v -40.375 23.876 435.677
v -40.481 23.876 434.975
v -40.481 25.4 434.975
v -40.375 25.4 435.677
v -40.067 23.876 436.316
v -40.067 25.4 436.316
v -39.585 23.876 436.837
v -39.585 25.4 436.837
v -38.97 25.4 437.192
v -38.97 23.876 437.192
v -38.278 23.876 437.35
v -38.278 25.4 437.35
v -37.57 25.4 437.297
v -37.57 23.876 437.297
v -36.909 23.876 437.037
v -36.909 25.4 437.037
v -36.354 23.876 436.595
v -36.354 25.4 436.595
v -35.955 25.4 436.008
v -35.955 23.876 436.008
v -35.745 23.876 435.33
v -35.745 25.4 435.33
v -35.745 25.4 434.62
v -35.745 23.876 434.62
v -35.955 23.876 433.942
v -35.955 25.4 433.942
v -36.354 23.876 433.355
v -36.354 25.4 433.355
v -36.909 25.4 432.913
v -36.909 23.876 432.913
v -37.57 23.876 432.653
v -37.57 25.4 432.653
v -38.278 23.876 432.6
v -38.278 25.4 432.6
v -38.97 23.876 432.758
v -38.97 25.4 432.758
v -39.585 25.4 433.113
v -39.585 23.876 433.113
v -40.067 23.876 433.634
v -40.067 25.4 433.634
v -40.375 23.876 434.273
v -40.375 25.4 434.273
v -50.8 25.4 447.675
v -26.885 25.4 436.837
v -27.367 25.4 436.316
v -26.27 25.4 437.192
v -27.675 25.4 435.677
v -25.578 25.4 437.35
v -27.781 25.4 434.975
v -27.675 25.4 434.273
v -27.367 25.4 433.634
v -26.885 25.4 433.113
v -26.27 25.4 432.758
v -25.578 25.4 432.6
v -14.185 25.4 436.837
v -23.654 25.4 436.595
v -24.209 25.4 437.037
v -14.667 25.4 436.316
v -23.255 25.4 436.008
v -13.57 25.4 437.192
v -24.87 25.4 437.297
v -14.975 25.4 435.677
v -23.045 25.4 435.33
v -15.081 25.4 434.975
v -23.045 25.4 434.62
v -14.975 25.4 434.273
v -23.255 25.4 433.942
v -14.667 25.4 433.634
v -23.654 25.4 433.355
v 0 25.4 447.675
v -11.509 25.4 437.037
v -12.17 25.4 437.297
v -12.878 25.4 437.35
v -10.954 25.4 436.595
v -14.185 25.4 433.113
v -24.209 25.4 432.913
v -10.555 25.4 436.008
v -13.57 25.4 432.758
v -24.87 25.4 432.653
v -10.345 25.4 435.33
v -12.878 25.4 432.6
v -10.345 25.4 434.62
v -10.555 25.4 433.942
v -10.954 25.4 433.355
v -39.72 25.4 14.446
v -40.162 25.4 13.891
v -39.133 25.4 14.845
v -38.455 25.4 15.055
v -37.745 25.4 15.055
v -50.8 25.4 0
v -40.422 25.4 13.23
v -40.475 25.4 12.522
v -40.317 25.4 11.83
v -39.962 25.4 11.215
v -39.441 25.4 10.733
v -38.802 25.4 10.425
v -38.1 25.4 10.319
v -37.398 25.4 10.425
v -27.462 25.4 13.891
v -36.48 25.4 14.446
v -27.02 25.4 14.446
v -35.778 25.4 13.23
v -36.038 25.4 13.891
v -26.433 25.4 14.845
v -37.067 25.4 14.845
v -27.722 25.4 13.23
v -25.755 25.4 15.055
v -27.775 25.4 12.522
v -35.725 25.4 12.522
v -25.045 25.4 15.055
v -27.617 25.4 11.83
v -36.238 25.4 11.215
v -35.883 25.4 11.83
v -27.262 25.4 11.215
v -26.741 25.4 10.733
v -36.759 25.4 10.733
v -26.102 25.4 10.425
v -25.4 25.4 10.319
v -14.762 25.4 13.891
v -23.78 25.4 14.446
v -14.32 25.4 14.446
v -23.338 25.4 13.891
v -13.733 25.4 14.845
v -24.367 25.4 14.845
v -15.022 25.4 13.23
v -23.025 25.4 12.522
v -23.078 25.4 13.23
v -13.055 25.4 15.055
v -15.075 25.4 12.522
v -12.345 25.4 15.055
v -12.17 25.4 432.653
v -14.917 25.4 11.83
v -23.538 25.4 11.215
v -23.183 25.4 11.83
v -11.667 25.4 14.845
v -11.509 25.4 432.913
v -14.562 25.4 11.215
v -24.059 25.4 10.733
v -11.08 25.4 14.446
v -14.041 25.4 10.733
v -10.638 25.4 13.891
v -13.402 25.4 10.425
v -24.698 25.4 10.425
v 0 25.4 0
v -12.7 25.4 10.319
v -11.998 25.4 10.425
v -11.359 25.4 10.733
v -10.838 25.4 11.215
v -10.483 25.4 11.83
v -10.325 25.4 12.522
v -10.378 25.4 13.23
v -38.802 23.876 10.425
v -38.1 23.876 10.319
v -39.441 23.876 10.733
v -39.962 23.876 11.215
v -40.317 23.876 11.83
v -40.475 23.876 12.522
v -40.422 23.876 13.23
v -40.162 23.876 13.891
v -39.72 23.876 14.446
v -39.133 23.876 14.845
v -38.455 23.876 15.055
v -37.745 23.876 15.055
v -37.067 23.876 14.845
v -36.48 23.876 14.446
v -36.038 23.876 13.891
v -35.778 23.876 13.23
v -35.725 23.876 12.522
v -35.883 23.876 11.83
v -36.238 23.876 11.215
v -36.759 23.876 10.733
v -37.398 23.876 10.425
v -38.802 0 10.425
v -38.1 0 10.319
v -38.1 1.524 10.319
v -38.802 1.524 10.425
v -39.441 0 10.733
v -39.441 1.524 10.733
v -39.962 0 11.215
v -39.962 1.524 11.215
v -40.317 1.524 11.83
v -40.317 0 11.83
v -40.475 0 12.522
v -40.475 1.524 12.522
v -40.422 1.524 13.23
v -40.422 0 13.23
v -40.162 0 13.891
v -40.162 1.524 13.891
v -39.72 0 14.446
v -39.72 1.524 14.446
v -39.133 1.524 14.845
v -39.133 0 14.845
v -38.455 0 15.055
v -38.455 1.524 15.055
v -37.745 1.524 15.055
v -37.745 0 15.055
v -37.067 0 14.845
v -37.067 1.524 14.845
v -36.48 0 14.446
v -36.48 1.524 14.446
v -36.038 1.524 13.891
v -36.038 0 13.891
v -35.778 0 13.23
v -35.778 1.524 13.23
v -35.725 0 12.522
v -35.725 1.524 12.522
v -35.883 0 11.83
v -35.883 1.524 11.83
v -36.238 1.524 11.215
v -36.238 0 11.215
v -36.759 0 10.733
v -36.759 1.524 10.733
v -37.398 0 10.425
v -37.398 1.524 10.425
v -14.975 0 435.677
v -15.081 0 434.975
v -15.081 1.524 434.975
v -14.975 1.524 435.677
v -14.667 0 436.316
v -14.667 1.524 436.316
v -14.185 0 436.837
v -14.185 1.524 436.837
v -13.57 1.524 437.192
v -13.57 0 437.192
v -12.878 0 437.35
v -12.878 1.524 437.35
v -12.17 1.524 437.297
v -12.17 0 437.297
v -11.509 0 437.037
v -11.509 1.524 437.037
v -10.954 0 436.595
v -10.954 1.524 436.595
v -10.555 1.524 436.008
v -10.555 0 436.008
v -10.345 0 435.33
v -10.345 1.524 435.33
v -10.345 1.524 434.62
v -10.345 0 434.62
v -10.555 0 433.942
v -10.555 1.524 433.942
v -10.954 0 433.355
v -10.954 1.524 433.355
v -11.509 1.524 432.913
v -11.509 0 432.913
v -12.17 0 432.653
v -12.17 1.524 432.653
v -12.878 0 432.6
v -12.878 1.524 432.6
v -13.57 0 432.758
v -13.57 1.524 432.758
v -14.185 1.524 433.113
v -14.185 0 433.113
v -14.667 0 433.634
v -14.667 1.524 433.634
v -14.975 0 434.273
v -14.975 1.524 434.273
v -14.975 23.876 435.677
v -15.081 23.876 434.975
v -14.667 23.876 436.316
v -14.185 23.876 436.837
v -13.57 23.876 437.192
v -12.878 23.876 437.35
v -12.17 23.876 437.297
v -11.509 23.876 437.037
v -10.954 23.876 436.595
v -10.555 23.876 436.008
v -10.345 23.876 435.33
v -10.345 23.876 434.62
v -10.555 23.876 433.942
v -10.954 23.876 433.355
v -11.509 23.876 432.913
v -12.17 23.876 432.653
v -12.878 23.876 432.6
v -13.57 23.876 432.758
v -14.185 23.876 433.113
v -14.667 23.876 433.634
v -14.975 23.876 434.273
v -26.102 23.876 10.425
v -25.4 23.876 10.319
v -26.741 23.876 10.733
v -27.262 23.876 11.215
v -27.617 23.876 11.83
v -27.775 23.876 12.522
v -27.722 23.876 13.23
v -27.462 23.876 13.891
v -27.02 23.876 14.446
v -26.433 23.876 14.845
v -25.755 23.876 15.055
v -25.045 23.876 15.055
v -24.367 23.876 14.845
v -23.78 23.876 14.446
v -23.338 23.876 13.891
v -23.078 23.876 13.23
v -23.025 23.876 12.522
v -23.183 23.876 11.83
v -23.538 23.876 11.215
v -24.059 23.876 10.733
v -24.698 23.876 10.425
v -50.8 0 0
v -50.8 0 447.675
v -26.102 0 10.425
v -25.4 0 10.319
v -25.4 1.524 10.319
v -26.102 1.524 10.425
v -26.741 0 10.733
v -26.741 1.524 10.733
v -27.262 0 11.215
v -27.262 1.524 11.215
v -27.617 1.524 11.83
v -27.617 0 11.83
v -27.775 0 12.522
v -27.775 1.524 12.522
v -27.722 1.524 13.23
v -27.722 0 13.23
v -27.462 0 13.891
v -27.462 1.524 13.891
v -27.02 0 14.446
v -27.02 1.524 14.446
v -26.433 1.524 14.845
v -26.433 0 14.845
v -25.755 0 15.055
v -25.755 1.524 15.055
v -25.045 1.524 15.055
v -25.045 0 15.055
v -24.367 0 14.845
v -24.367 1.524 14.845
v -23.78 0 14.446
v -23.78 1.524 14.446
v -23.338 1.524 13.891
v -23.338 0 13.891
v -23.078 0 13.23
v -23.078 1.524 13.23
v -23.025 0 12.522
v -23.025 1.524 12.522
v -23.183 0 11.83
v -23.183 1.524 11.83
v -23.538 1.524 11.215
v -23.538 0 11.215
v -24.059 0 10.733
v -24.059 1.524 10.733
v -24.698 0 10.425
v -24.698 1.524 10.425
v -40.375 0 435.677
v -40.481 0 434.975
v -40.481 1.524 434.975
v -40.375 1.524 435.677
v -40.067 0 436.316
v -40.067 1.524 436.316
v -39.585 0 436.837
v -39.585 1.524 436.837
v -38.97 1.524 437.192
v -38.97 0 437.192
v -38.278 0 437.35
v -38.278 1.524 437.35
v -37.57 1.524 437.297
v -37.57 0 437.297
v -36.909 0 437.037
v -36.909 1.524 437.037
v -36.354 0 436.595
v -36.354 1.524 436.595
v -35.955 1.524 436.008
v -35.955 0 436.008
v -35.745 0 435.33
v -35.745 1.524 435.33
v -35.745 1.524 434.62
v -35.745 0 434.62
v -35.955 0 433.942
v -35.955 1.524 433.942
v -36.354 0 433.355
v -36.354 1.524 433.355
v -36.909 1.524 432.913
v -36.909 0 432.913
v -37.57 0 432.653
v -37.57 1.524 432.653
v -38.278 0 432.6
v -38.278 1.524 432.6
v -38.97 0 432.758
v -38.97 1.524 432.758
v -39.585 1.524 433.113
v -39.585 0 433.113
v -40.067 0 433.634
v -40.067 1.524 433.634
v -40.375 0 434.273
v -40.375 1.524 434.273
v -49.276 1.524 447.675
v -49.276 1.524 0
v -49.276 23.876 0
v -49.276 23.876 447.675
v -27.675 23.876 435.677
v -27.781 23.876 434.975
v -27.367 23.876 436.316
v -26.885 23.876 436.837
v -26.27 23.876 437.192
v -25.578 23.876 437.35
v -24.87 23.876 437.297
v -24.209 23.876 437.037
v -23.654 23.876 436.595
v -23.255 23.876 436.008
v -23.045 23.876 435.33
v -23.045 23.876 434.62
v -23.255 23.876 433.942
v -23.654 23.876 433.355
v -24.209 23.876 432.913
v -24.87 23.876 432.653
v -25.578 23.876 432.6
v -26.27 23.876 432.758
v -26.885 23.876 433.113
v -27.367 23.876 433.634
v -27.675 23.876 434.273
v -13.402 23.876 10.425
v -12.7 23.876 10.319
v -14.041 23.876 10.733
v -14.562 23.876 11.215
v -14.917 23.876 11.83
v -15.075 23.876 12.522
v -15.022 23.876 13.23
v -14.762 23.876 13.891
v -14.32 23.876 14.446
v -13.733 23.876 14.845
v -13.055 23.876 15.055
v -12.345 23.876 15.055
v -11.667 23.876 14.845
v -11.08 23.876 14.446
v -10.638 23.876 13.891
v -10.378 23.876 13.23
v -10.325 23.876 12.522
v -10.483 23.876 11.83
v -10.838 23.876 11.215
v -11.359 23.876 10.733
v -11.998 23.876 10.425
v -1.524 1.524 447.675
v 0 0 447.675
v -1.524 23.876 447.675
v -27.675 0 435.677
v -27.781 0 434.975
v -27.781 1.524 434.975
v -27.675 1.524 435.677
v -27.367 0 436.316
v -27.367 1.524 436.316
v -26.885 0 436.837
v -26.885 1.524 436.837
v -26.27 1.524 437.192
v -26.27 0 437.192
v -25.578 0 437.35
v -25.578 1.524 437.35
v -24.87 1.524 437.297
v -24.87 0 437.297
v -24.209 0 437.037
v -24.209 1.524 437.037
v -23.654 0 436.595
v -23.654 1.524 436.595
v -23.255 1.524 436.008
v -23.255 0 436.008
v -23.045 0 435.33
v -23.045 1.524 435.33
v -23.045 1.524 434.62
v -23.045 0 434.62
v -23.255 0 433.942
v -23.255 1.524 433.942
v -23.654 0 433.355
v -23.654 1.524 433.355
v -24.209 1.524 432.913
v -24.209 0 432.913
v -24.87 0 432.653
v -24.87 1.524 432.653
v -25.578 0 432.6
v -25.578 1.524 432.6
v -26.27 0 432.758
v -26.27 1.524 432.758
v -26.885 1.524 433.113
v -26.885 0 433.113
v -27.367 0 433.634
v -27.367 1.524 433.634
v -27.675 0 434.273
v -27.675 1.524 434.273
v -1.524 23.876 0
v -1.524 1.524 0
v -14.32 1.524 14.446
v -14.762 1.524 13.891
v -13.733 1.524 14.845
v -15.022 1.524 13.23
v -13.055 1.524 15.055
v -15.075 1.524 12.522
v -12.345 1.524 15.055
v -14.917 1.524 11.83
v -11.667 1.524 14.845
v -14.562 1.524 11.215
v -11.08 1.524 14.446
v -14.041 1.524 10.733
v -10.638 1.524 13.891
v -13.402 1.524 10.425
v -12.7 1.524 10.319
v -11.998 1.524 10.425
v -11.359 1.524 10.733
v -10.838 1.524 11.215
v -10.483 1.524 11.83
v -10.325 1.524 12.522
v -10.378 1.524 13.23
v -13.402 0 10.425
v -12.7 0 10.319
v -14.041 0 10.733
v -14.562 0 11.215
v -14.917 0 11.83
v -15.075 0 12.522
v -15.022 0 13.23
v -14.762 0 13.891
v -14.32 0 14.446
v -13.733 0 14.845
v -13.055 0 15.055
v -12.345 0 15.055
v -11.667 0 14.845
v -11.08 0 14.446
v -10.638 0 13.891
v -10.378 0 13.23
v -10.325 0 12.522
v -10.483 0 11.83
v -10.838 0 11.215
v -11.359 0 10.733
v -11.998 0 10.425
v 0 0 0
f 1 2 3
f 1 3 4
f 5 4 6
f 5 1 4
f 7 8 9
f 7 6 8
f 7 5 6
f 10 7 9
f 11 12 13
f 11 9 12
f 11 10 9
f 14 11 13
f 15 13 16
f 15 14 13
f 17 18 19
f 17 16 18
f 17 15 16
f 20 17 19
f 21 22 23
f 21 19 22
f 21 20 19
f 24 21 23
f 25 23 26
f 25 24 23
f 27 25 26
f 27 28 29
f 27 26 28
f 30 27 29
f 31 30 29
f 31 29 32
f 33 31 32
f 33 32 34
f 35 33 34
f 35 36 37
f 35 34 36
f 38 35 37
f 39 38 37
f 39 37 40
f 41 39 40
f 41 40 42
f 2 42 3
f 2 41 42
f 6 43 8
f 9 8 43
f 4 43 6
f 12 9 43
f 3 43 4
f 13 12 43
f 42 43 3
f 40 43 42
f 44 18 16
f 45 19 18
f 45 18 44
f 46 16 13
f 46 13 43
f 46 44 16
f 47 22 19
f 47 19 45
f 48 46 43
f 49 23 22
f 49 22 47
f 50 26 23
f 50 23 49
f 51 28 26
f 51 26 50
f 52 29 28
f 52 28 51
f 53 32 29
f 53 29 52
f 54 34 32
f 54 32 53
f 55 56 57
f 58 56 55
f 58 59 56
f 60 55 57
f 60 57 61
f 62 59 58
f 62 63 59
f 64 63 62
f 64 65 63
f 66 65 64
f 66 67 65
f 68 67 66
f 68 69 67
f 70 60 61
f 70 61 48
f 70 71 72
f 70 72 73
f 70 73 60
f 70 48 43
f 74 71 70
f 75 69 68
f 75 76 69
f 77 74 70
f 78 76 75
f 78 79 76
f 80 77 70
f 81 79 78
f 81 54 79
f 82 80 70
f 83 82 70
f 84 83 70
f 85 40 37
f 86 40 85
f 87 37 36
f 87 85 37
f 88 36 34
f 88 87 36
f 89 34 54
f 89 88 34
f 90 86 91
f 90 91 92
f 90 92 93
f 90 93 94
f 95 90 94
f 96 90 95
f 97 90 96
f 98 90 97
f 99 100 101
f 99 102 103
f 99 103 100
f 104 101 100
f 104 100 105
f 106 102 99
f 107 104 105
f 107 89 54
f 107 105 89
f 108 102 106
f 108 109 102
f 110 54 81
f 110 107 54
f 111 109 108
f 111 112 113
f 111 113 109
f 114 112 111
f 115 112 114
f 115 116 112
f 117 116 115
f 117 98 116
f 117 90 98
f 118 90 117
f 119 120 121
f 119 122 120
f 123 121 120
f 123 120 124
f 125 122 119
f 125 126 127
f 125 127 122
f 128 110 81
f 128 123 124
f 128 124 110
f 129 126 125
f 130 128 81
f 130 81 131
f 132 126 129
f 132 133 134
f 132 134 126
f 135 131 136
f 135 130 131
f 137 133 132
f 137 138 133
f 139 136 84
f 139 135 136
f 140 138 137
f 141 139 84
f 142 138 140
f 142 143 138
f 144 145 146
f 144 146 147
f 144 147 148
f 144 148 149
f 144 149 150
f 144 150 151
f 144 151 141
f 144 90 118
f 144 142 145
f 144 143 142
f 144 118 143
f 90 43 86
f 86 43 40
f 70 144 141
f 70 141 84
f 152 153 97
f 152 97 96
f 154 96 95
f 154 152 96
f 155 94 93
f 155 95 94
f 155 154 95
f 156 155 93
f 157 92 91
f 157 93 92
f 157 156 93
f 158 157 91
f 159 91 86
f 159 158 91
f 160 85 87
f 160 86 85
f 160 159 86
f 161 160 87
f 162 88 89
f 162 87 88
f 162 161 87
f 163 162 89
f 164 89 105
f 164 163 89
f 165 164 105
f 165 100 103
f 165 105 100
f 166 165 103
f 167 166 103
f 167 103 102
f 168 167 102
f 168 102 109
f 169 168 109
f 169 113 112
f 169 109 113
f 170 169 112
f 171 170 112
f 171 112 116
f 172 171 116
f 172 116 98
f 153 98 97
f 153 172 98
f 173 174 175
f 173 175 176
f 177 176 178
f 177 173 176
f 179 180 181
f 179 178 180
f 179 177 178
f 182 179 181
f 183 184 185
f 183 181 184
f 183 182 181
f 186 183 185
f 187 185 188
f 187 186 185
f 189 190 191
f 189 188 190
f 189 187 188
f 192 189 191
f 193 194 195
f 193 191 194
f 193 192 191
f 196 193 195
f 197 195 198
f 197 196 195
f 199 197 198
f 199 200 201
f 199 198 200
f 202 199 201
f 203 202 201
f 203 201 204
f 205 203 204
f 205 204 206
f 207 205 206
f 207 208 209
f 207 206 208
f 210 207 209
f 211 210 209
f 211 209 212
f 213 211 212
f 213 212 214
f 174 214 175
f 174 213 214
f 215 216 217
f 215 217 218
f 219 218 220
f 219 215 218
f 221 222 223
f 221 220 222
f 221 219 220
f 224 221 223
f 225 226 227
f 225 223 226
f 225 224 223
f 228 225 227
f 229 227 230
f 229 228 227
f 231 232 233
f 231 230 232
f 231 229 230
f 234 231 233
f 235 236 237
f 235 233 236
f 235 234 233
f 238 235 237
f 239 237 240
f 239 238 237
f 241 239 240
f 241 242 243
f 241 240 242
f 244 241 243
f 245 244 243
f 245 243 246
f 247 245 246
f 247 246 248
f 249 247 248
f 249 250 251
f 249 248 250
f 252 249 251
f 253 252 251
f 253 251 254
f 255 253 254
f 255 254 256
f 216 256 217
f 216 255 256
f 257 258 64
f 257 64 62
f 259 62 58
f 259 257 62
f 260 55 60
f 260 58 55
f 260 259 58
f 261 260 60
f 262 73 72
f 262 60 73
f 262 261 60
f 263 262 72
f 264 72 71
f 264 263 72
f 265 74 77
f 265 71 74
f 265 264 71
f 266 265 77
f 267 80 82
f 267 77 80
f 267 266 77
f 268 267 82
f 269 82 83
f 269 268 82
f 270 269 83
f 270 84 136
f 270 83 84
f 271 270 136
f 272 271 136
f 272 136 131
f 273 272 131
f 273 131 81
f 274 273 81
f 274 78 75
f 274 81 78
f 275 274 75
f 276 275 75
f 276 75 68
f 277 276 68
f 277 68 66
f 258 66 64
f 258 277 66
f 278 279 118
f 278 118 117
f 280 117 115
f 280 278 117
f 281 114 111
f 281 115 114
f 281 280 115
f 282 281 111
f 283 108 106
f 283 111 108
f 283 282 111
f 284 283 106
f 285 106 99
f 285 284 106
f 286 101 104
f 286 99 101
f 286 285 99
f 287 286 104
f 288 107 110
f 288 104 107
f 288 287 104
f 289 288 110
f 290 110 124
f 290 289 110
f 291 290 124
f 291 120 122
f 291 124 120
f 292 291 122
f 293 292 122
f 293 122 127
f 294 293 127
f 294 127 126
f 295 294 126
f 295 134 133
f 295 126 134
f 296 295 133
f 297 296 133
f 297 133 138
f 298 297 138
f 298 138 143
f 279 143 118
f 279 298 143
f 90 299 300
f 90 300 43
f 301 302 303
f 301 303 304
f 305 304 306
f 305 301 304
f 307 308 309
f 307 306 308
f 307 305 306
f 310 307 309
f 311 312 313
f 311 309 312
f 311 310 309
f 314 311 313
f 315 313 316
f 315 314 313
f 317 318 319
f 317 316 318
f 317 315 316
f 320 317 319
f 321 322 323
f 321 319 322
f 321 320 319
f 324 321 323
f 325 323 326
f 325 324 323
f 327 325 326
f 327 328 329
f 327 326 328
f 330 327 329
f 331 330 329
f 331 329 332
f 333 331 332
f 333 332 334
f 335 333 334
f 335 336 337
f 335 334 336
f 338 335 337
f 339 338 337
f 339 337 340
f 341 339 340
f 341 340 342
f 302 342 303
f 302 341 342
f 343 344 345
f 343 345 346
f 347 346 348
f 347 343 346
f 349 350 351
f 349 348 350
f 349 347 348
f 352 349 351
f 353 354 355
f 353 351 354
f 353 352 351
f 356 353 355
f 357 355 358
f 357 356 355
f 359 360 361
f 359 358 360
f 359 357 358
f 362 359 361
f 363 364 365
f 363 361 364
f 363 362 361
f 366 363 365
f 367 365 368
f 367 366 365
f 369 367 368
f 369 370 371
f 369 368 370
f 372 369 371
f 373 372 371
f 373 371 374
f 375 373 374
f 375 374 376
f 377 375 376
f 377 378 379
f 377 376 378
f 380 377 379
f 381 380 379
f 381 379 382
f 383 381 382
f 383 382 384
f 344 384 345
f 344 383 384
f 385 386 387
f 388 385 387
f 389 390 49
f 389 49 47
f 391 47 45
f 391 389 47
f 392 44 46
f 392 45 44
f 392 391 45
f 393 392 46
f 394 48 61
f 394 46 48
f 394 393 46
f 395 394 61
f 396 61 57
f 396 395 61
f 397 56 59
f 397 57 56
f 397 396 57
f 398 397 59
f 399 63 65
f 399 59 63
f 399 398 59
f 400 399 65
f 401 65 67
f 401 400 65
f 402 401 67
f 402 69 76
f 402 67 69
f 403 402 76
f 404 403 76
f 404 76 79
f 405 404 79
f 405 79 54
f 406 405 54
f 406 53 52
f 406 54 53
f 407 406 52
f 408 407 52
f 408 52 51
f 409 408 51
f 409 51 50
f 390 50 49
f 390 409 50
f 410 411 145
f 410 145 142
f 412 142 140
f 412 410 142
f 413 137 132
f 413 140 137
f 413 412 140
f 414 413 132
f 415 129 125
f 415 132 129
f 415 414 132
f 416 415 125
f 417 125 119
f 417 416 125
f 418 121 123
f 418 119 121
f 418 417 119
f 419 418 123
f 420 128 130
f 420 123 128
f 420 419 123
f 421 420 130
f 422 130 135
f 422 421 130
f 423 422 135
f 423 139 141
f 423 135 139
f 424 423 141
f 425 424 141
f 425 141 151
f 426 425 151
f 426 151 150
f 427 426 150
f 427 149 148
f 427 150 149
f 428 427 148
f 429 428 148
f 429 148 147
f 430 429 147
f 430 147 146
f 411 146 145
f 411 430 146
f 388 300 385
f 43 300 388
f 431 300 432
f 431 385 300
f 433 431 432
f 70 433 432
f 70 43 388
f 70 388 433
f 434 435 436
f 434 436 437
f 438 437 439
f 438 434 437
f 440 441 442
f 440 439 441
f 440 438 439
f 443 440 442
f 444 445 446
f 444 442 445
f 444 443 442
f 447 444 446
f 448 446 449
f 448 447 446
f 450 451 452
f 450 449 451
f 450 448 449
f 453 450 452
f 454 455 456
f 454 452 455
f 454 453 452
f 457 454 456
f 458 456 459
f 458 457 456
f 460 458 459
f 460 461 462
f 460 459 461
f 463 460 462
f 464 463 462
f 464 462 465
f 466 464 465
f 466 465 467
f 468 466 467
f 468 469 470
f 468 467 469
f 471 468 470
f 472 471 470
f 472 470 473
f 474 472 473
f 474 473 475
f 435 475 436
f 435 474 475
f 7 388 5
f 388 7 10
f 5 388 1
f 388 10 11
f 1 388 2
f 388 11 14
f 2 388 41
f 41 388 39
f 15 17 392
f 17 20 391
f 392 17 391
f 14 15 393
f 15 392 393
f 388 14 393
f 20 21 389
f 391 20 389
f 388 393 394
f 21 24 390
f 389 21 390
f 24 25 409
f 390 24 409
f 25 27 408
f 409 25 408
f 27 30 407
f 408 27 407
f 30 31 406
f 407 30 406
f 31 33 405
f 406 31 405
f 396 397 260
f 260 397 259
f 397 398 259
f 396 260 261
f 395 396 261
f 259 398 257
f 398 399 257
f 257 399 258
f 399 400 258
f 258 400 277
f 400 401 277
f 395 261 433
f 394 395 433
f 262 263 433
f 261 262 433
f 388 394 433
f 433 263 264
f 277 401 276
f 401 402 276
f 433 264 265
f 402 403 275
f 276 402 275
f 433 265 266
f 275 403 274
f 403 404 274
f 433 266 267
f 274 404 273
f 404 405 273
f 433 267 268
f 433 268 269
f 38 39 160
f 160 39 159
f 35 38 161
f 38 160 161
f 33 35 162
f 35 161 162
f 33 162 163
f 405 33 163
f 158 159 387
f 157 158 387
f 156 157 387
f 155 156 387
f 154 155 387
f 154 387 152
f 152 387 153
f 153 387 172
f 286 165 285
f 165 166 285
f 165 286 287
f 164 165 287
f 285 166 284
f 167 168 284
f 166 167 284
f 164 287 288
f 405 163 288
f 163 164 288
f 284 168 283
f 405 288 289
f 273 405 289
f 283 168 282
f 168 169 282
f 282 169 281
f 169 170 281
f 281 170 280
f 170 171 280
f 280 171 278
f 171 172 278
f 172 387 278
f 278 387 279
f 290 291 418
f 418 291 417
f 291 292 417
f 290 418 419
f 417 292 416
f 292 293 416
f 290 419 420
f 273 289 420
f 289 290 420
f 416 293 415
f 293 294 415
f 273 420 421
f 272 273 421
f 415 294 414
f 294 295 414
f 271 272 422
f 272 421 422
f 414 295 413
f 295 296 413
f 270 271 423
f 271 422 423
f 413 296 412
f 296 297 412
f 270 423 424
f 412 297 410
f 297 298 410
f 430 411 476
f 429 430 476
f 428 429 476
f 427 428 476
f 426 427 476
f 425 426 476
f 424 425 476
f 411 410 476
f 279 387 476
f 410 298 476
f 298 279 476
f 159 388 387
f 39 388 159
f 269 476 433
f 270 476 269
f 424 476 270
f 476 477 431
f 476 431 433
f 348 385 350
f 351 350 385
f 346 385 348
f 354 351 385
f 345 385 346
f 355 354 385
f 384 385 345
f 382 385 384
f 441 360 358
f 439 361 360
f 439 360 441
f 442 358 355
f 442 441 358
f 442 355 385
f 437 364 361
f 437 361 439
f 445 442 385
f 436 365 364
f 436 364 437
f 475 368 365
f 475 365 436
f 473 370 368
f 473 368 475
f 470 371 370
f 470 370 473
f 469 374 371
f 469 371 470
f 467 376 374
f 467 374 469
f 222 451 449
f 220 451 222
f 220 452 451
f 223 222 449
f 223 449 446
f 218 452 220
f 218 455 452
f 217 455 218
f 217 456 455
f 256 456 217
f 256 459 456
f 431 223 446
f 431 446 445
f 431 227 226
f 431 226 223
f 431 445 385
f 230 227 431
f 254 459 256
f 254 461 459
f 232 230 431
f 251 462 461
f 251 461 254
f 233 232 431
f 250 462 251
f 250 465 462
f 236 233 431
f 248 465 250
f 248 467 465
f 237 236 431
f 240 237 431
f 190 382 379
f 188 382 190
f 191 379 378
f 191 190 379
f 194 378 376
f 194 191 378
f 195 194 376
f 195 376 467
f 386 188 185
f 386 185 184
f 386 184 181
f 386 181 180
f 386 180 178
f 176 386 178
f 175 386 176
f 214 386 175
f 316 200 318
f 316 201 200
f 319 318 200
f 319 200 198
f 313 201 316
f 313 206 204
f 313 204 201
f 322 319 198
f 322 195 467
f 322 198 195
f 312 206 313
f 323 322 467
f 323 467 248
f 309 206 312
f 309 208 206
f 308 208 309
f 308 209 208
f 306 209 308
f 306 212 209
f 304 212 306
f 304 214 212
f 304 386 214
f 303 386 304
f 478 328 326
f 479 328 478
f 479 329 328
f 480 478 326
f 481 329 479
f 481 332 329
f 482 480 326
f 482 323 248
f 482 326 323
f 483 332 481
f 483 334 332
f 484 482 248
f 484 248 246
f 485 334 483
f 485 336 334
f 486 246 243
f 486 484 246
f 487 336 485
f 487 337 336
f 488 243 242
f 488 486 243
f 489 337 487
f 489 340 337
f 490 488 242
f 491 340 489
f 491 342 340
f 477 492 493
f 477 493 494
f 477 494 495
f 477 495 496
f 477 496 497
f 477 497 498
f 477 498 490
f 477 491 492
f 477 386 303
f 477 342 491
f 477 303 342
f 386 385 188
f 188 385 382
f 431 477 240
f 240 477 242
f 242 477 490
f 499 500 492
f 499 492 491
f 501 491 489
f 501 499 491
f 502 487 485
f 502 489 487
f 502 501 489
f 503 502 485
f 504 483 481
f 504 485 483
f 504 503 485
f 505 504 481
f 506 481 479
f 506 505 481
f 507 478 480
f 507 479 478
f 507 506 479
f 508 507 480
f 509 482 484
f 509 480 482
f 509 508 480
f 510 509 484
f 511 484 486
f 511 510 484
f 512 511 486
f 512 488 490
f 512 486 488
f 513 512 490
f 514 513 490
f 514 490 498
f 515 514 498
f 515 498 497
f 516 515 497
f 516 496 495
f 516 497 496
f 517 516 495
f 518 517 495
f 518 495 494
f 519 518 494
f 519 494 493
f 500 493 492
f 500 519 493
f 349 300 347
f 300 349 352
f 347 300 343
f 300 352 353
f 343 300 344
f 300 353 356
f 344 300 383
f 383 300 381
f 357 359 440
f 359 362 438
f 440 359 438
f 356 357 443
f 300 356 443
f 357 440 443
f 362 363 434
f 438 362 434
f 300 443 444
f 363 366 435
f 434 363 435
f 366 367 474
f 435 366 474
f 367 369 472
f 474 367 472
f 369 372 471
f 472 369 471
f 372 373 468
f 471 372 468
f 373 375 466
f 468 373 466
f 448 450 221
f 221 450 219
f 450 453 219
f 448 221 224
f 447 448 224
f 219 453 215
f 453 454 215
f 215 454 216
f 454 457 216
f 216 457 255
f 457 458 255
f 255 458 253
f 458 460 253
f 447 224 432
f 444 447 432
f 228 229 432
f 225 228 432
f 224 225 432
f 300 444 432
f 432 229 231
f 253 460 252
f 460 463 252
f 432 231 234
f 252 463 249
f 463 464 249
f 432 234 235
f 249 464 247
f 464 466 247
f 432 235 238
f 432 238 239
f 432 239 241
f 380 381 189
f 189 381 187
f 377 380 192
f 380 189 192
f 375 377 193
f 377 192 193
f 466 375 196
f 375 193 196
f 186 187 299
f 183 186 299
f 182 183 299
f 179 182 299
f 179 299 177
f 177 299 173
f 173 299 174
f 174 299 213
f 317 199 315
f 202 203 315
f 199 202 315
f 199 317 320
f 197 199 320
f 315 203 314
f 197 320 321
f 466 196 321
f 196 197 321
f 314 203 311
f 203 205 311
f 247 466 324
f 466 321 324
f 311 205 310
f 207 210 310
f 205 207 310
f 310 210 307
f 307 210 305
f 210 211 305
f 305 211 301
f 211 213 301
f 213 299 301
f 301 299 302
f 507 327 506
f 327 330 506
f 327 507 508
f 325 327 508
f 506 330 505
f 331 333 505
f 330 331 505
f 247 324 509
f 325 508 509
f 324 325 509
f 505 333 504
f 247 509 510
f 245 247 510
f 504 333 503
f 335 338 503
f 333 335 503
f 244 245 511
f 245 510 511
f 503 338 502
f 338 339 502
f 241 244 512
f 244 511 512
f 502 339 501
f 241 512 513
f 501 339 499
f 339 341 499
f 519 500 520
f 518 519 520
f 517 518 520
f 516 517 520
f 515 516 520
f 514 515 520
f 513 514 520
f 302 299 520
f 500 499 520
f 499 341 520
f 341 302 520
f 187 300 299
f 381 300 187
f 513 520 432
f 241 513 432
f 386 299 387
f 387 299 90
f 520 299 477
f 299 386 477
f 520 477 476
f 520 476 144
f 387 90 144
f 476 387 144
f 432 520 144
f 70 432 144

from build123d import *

# Parameters (mm, degrees)
SKETCH1_W               = 50.8
SKETCH1_H               = 25.4
SKETCH1_W_2             = 47.752
SKETCH1_H_2             = 22.352
EXTRUDE_THIN1_DEPTH     = 447.675
CUT_EXTRUDE1_DEPTH      = 452.263454786
CUT_EXTRUDE1_DEPTH_BACK = 452.263454786
SKETCH2_R               = 2.38125


with BuildPart() as part:
    # Sketch1 → Extrude-Thin1 (new body)
    with BuildSketch(Plane.XY):
        with Locations((-25.4, 12.7)):
            Rectangle(SKETCH1_W, SKETCH1_H)
        with Locations((-25.4, 12.7)):
            Rectangle(SKETCH1_W_2, SKETCH1_H_2, mode=Mode.SUBTRACT)
    extrude(amount=EXTRUDE_THIN1_DEPTH)

    # Sketch2 → Cut-Extrude1 (cut, two sides: drawn at the far end of the back side and taken through both)
    with BuildSketch(Plane(origin=(0, 25.4, 0), x_dir=(1, 0, 0), z_dir=(0, 1, 0)).offset(-CUT_EXTRUDE1_DEPTH_BACK)):
        with Locations(Location((-38.1, -434.975, 0), (0, 0, 180))):
            Circle(SKETCH2_R)
        with Locations(Location((-25.4, -434.975, 0), (0, 0, 180))):
            Circle(SKETCH2_R)
        with Locations(Location((-12.7, -434.975, 0), (0, 0, 180))):
            Circle(SKETCH2_R)
        with Locations(Location((-38.1, -12.7, 0), (0, 0, 90))):
            Circle(SKETCH2_R)
        with Locations(Location((-12.7, -12.7, 0), (0, 0, 90))):
            Circle(SKETCH2_R)
        with Locations(Location((-25.4, -12.7, 0), (0, 0, 90))):
            Circle(SKETCH2_R)
    extrude(amount=CUT_EXTRUDE1_DEPTH + CUT_EXTRUDE1_DEPTH_BACK, mode=Mode.SUBTRACT)


solid = part.part
